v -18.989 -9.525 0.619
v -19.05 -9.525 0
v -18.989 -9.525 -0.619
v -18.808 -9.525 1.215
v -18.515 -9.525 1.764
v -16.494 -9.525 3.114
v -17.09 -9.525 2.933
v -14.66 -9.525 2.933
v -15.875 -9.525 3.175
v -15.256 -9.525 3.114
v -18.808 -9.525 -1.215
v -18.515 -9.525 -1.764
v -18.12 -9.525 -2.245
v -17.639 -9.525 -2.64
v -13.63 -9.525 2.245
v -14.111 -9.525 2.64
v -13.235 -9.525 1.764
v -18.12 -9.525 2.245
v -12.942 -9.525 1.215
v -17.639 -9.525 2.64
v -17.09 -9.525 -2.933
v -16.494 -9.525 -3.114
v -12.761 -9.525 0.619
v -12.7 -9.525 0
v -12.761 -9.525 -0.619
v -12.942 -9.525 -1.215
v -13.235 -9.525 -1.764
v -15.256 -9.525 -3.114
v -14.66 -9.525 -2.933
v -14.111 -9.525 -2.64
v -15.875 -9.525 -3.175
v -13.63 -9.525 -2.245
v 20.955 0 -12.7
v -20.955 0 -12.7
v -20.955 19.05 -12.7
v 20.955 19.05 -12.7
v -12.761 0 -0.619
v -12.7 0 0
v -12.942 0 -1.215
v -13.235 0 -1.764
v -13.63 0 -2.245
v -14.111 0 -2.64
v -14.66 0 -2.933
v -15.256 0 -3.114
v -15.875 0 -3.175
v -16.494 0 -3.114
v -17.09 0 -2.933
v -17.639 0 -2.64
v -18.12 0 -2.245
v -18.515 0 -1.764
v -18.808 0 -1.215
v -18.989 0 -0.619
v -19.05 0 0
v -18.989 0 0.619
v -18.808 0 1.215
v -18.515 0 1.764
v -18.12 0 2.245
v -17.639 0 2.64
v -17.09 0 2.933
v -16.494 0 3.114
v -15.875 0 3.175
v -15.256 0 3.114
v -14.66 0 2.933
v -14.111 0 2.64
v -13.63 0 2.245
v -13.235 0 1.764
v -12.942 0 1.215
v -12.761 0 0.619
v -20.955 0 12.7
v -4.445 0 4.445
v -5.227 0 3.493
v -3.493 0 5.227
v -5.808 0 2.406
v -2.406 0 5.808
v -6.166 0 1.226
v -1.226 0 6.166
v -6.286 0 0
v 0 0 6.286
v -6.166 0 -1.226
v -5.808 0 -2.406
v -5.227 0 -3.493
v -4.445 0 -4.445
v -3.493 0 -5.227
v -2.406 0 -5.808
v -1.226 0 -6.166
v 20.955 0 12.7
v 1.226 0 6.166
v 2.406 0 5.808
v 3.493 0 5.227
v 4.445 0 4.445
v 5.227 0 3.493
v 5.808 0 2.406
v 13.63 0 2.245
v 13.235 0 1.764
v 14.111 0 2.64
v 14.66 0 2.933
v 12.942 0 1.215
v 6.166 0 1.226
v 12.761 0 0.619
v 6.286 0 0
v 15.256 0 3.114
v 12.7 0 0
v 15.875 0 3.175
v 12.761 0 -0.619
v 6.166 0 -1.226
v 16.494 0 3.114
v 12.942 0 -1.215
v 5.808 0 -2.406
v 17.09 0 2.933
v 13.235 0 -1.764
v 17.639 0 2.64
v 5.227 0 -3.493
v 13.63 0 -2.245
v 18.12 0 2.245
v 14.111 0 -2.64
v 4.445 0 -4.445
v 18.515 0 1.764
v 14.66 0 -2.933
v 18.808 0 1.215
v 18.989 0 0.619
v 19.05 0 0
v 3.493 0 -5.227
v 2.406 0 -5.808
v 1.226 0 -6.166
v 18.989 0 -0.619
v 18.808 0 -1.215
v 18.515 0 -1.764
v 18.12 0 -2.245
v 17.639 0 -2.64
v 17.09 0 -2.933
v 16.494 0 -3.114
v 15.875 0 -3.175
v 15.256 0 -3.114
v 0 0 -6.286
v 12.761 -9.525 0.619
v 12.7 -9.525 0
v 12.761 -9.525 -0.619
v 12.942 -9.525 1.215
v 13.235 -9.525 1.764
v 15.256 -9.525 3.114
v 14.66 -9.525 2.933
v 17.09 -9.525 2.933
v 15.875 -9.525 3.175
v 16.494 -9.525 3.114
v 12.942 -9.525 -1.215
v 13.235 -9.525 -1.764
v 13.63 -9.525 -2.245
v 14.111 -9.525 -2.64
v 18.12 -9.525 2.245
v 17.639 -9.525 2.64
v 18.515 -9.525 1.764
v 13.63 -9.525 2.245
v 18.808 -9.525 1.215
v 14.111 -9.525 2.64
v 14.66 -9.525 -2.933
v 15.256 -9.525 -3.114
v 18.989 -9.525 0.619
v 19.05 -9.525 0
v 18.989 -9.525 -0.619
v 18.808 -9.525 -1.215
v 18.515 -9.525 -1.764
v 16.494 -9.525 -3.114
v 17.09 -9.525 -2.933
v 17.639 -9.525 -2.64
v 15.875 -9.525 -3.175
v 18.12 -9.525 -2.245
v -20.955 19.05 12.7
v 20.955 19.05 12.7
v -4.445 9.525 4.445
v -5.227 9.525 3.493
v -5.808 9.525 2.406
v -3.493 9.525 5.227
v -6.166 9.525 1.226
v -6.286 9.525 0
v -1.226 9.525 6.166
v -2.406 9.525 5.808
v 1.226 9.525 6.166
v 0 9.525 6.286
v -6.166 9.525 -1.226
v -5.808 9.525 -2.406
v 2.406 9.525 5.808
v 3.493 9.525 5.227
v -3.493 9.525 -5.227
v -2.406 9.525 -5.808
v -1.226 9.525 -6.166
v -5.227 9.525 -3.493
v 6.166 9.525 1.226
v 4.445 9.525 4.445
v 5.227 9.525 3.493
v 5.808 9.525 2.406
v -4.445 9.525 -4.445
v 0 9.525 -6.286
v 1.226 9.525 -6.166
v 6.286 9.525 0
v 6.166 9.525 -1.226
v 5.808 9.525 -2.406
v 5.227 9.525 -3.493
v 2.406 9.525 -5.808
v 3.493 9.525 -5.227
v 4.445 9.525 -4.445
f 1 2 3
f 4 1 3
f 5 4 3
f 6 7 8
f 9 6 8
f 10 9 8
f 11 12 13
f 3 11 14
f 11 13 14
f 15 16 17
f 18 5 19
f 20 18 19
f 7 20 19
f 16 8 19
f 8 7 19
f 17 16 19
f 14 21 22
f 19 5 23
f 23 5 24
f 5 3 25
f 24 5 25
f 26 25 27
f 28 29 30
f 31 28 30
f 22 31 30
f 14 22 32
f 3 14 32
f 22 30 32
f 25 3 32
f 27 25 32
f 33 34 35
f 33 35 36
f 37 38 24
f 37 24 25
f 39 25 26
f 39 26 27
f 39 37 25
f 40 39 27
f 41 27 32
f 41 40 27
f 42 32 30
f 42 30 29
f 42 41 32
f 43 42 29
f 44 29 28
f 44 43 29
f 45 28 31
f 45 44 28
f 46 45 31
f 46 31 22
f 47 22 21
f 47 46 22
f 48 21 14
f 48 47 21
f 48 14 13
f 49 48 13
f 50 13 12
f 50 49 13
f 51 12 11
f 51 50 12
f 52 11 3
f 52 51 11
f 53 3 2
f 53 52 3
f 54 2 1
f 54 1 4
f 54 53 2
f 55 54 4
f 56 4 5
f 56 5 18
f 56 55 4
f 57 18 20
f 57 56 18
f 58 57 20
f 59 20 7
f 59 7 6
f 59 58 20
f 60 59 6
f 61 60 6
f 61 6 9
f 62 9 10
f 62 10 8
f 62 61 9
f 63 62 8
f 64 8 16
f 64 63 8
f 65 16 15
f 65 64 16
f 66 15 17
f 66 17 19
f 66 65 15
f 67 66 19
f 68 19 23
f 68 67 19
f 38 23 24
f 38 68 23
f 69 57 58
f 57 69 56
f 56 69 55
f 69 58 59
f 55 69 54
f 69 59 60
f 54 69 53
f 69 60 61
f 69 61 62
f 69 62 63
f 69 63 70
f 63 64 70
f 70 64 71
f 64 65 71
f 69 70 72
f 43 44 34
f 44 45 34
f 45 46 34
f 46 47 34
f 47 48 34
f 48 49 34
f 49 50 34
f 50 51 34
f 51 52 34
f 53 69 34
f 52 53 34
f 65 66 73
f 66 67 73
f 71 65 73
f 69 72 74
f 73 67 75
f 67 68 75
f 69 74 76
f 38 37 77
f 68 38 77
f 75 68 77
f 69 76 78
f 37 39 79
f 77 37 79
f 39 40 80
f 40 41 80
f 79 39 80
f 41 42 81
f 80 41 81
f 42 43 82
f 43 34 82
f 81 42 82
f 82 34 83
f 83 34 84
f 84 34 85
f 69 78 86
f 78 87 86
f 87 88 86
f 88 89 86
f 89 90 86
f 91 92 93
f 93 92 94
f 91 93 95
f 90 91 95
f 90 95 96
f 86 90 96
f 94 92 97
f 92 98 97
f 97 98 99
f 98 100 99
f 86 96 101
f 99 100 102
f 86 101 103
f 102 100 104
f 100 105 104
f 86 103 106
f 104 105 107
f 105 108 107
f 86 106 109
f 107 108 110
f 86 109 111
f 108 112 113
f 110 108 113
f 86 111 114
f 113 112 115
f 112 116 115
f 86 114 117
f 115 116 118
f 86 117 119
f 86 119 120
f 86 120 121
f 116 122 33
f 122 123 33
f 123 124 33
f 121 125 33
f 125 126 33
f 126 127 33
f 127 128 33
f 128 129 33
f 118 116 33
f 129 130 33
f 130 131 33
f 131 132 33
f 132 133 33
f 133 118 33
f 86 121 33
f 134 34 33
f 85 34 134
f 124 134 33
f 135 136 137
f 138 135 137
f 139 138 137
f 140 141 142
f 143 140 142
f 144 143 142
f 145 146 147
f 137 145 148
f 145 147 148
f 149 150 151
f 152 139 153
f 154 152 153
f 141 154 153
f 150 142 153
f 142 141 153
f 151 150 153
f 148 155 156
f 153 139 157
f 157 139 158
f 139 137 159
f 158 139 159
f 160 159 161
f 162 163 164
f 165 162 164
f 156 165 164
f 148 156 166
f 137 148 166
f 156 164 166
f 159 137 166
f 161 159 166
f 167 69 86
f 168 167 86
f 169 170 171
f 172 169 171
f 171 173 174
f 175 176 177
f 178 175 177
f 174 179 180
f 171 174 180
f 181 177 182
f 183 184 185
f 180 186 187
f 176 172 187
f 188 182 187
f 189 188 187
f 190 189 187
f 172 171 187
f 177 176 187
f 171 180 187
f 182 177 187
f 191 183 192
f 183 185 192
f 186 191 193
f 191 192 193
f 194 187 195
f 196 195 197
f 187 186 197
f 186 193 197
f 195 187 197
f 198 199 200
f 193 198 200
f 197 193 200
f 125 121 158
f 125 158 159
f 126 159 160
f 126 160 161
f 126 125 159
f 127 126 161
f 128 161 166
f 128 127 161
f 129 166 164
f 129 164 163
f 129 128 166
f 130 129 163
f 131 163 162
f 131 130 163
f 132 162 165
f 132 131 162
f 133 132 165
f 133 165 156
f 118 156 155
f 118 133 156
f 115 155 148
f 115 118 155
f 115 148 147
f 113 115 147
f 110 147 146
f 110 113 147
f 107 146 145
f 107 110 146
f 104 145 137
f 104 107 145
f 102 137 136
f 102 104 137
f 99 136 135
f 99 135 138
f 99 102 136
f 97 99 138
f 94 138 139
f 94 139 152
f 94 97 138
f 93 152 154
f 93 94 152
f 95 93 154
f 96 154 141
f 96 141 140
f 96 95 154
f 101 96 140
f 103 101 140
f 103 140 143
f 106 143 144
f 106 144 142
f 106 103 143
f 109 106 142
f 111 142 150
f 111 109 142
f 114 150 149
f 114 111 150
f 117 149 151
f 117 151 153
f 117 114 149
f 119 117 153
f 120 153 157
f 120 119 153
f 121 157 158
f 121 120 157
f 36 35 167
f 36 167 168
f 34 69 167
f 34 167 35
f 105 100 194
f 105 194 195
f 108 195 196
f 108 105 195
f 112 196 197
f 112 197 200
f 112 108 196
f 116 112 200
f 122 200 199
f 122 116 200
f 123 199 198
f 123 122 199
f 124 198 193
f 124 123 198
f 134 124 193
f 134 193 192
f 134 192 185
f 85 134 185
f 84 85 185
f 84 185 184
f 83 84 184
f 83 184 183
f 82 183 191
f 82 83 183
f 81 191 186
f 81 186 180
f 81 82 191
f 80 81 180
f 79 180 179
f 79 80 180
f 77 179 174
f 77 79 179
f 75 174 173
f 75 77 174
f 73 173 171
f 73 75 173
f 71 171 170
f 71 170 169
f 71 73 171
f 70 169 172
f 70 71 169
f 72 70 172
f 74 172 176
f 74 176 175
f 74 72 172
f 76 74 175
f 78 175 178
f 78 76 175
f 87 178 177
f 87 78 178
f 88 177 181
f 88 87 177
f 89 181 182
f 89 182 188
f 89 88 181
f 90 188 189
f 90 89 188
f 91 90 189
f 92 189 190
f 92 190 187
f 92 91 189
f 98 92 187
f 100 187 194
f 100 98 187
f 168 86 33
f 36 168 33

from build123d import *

# Parameters (mm, degrees)
SKETCH1_W           = 41.91
SKETCH1_H           = 25.4
BOSS_EXTRUDE1_DEPTH = 19.05
SKETCH1_4_R         = 6.2865
CUT_EXTRUDE1_DEPTH  = 9.525
SKETCH1_5_R         = 3.175
BOSS_EXTRUDE2_DEPTH = 9.525


with BuildPart() as part:
    # Sketch1 → Boss-Extrude1 (new body)
    with BuildSketch(Plane(origin=(0, 0, 0), x_dir=(1, 0, 0), z_dir=(0, 1, 0))):
        Rectangle(SKETCH1_W, SKETCH1_H)
    extrude(amount=BOSS_EXTRUDE1_DEPTH)

    # Sketch1<4> → Cut-Extrude1 (cut)
    with BuildSketch(Plane(origin=(0, 0, 0), x_dir=(1, 0, 0), z_dir=(0, 1, 0))):
        Circle(SKETCH1_4_R)
    extrude(amount=CUT_EXTRUDE1_DEPTH, mode=Mode.SUBTRACT)

    # Sketch1<5> → Boss-Extrude2 (add)
    with BuildSketch(Plane(origin=(0, 0, 0), x_dir=(1, 0, 0), z_dir=(0, 1, 0))):
        with Locations((-15.875, 0)):
            Circle(SKETCH1_5_R)
        with Locations((15.875, 0)):
            Circle(SKETCH1_5_R)
    extrude(amount=-BOSS_EXTRUDE2_DEPTH)


solid = part.part
